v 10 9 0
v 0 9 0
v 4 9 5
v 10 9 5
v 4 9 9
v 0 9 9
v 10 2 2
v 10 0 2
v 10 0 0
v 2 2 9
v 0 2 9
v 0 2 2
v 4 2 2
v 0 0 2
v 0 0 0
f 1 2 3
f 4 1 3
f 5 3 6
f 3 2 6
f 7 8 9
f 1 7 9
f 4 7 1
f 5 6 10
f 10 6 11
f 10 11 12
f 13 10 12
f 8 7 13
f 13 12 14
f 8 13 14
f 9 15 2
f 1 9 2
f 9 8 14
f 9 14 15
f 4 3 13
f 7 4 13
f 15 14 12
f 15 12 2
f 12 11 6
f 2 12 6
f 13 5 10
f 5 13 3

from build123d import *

# Parameters (mm, degrees)
F1_DEPTH = 10
F2_DEPTH = 4
F6_DEPTH = 7.9481941424


with BuildPart() as f1:
    # F0 (on Right) → F1 (new body)
    with BuildSketch(Plane.YZ):
        Polygon((0, 2), (0, 0), (9, 0), (9, 2), (2, 2), align=None)
        Polygon((2, 2), (9, 2), (9, 5), align=None)
    extrude(amount=F1_DEPTH)

    # F0 (on Right) → F2 (join)
    with BuildSketch(Plane.YZ):
        Polygon((2, 9), (2, 2), (9, 5), (9, 9), align=None)
    extrude(amount=F2_DEPTH)

    # F5 (on 3pt) → F6 (cut, through all)
    with BuildSketch(Plane(origin=(3.4385964912, -0.9824561404, 0.9824561404), x_dir=(-0.2547139161, -0.9642741111, -0.0727754046), z_dir=(-0.9271726499, 0.2649064714, -0.2649064714))):
        Polygon((-3.0929546961, 0.8241633837), (-3.0929546961, 8.104273273), (-10.3523013063, 7.5548310172), align=None)
    extrude(amount=-F6_DEPTH, mode=Mode.SUBTRACT)


solid = f1.part
